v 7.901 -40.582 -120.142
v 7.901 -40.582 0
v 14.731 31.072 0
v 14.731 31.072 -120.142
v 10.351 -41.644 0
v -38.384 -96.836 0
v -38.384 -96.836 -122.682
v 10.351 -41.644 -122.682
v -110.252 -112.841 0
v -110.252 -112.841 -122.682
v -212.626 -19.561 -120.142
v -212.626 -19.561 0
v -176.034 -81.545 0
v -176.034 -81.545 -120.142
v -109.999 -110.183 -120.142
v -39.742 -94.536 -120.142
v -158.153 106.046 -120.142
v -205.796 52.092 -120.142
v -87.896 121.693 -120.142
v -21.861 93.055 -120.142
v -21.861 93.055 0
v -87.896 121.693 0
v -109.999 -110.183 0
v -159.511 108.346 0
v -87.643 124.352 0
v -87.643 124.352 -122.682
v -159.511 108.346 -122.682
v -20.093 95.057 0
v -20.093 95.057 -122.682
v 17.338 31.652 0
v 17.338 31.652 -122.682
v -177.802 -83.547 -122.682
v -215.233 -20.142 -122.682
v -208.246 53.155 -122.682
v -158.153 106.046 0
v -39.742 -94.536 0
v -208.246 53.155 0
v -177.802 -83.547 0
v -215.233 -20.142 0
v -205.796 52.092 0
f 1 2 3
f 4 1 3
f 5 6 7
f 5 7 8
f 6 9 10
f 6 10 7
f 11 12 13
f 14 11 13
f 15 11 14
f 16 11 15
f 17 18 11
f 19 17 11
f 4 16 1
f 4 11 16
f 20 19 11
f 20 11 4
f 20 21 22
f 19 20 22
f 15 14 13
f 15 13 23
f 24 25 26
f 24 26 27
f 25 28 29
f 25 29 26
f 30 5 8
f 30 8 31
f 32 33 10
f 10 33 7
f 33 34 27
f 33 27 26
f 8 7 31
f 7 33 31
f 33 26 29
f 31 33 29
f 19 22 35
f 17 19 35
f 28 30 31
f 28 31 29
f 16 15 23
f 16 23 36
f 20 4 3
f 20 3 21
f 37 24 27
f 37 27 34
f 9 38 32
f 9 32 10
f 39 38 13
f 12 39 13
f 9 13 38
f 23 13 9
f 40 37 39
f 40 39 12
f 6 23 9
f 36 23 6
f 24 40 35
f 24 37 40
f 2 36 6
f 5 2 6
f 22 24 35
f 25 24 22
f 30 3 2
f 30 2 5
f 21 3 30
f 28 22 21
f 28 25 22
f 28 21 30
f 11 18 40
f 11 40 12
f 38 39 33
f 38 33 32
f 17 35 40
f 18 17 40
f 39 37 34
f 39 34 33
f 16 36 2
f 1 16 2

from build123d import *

# Parameters (mm, degrees)
F1_DEPTH = 122.682
F2_T     = -2.54


with BuildPart() as f1:
    # F0 (on Top) → F1 (new body)
    with BuildSketch(Plane.XY):
        Polygon((-38.383844, -96.835967), (10.351066, -41.644384), (17.337637, 31.652206), (-20.092763, 95.056997), (-87.642993, 124.351513), (-159.511162, 108.346245), (-208.246071, 53.154662), (-215.232642, -20.141928), (-177.802243, -83.546719), (-110.252012, -112.841235), align=None)
    extrude(amount=-F1_DEPTH)

    # F2
    f2_openings = [f1.faces().sort_by_distance(p)[0] for p in [
        (-98.947503, 5.755139, 0),
    ]]
    offset(amount=F2_T, openings=f2_openings)


solid = f1.part
